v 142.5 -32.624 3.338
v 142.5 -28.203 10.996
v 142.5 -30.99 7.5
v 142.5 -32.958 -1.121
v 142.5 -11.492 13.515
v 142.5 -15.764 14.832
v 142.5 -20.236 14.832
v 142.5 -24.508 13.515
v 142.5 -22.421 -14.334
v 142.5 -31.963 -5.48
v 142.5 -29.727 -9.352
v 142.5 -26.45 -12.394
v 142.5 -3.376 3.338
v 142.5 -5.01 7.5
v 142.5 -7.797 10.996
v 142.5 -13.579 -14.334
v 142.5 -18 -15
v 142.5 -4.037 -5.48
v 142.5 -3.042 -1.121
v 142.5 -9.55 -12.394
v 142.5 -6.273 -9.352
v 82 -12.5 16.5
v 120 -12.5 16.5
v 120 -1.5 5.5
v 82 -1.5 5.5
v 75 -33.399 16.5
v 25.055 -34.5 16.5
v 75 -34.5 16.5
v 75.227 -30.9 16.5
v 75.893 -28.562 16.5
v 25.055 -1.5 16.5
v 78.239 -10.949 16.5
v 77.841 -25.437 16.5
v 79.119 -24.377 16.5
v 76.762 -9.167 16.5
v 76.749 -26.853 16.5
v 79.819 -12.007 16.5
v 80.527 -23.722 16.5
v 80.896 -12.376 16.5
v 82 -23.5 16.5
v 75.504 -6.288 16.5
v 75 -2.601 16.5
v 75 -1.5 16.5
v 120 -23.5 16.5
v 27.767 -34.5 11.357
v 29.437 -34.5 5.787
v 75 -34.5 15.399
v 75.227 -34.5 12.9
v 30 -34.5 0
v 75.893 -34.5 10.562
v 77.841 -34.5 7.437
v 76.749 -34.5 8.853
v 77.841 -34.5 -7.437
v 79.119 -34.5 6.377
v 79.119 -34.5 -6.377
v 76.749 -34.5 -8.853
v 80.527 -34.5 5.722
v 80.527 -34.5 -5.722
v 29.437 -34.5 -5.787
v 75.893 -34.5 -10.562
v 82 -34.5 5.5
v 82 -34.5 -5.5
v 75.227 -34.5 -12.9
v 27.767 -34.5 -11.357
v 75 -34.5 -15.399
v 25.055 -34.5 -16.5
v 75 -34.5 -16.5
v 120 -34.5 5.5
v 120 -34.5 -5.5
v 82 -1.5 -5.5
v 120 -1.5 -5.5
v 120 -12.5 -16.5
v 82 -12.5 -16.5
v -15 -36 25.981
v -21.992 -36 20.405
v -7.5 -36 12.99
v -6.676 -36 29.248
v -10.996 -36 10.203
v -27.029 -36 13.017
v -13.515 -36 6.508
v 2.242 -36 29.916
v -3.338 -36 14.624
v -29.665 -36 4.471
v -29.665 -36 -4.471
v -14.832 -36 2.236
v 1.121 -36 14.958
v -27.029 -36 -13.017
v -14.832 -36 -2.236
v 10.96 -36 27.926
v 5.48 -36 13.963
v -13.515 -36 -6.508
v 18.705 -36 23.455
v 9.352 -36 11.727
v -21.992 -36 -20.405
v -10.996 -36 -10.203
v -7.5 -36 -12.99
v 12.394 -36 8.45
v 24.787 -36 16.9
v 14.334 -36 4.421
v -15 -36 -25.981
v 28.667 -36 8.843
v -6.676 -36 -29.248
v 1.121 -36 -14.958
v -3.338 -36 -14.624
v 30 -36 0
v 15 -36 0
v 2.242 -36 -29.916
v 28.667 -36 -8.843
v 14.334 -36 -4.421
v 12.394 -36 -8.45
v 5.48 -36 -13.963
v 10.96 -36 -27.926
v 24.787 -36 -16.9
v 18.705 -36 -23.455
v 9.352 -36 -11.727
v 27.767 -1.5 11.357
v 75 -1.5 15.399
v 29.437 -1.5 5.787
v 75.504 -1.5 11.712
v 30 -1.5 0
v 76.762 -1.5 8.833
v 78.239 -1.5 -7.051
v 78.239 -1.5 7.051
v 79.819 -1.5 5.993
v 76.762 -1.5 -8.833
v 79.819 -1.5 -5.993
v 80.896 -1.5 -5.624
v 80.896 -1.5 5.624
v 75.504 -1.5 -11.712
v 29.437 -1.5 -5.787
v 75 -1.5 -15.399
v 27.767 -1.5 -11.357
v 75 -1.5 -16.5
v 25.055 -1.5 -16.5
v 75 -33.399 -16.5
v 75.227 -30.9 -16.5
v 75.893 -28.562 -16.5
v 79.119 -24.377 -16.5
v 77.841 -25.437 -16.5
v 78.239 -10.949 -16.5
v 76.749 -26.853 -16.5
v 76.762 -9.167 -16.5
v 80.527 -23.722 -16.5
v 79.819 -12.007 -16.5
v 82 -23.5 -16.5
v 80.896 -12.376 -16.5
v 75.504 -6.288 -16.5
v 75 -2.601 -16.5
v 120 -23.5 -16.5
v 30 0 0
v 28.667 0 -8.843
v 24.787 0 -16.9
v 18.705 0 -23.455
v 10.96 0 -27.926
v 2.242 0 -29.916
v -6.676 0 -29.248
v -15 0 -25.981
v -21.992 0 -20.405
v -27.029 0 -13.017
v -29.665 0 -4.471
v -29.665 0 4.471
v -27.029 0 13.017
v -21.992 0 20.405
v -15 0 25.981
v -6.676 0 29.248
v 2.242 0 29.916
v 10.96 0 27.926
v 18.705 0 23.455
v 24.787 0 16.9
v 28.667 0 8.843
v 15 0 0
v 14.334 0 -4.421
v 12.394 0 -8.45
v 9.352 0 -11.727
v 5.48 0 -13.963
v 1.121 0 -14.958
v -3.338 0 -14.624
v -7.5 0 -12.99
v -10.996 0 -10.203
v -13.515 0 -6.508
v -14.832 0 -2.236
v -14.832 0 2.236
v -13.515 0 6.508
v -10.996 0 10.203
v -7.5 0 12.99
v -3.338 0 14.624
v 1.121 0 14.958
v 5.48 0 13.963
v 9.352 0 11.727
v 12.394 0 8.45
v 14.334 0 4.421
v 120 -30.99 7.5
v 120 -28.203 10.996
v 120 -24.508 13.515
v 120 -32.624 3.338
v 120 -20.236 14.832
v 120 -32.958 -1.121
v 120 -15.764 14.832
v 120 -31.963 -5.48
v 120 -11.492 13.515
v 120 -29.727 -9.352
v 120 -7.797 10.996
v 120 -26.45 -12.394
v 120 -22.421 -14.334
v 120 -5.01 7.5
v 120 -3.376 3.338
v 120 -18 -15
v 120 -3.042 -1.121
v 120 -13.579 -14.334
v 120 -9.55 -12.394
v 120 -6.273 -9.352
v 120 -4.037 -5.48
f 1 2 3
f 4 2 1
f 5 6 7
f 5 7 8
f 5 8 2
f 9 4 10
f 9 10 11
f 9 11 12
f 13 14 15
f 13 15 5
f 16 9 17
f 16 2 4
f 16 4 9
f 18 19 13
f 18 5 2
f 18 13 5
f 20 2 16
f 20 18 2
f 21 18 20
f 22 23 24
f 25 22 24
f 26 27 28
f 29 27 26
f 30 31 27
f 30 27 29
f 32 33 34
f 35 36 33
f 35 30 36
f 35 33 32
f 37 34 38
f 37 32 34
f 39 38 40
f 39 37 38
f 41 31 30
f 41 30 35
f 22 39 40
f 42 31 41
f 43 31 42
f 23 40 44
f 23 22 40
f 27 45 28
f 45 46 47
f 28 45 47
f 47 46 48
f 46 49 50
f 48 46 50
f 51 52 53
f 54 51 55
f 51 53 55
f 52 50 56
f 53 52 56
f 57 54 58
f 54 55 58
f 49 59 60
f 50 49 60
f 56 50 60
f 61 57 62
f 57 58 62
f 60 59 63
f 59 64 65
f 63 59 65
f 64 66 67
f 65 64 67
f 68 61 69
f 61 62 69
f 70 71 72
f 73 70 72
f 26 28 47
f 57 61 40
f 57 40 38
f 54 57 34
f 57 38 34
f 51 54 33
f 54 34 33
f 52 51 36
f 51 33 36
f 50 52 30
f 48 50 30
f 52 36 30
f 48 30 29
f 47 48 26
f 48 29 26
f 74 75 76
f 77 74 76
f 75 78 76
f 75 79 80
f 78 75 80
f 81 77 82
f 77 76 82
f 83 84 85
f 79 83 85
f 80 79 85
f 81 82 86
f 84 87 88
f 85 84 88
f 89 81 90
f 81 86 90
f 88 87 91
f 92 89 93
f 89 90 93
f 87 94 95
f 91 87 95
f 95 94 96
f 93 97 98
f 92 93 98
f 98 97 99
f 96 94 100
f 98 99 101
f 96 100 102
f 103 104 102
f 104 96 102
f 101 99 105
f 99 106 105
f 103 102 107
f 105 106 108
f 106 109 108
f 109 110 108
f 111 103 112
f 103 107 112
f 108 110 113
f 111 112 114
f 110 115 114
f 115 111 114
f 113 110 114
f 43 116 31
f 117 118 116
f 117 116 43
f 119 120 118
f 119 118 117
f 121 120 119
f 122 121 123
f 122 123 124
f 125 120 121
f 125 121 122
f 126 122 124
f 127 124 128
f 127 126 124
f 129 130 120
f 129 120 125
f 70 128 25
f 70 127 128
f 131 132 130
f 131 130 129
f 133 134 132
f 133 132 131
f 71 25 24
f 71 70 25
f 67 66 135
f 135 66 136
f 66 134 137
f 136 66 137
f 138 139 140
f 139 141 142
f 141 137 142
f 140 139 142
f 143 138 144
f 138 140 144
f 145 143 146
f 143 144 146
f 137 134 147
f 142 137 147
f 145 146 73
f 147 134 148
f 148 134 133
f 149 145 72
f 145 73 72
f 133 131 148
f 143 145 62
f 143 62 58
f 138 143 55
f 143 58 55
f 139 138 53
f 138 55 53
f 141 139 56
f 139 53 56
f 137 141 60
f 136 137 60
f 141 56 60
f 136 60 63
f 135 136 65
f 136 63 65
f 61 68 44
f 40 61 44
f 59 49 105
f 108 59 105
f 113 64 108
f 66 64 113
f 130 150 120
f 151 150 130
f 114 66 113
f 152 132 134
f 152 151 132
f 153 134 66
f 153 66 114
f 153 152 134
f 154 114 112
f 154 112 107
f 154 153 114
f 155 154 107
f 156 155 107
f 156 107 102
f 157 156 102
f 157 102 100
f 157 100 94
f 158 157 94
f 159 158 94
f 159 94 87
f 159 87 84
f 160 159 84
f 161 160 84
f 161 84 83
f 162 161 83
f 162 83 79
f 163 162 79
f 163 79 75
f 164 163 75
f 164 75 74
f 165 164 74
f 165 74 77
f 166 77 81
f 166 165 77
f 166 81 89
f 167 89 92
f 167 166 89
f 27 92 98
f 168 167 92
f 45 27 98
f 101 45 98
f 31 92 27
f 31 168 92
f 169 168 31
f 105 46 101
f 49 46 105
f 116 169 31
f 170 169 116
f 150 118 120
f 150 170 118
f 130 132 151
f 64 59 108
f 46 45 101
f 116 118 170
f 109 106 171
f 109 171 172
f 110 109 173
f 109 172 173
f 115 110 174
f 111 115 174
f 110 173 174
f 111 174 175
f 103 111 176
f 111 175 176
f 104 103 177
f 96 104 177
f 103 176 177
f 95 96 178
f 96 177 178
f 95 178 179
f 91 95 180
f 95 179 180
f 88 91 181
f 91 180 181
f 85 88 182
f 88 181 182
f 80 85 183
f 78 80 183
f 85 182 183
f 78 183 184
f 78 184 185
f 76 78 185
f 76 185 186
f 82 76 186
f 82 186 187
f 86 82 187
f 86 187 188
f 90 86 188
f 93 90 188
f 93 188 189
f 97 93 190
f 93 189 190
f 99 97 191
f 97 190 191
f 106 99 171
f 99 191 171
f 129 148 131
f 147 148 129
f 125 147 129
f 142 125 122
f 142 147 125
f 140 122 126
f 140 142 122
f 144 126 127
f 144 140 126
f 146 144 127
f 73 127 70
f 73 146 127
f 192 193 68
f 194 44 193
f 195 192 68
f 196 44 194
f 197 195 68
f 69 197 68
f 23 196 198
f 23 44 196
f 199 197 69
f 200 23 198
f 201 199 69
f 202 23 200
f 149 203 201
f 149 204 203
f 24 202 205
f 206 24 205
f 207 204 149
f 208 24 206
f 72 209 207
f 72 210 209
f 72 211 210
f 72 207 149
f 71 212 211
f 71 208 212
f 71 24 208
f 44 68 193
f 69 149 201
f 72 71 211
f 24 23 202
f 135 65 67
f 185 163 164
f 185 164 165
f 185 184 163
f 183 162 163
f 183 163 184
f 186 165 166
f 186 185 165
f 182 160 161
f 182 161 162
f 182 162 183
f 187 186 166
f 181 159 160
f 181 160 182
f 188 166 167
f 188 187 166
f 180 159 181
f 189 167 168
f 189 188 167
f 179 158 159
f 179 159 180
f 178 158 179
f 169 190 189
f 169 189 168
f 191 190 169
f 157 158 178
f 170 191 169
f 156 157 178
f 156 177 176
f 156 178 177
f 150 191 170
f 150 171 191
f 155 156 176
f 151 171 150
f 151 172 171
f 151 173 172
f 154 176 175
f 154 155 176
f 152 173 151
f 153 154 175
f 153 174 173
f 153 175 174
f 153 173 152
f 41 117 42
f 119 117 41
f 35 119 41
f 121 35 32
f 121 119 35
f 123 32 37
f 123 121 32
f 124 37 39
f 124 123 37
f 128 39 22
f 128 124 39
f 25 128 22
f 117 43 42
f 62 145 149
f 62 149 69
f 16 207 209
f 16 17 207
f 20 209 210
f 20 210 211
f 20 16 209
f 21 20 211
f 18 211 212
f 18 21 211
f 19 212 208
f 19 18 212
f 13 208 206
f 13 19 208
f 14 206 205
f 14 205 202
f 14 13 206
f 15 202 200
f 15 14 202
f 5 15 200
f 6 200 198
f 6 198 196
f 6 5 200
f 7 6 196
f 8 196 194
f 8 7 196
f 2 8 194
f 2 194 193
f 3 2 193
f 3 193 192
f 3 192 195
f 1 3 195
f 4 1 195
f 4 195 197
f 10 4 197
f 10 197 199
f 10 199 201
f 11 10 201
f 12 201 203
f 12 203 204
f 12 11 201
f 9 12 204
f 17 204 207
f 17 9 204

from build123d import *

# Parameters (mm, degrees)
SKETCH1_R           = 30
SKETCH1_R_2         = 15
BOSS_EXTRUDE1_DEPTH = 36
SKETCH2_W           = 94.945060367
SKETCH2_H           = 33
BOSS_EXTRUDE2_DEPTH = 16.5
CUT_EXTRUDE1_DEPTH  = 45
FILLET1_R           = 7
SKETCH4_R           = 15
BOSS_EXTRUDE3_DEPTH = 22.5


with BuildPart() as part:
    # Sketch1 → Boss-Extrude1 (new body)
    with BuildSketch(Plane(origin=(0, 0, 0), x_dir=(1, 0, 0), z_dir=(0, 1, 0))):
        Circle(SKETCH1_R)
        Circle(SKETCH1_R_2, mode=Mode.SUBTRACT)
    extrude(amount=-BOSS_EXTRUDE1_DEPTH)

    # Sketch2 → Boss-Extrude2 (add, symmetric)
    with BuildSketch(Plane(origin=(0, -18, 0), x_dir=(1, 0, 0), z_dir=(0, 1, 0))):
        with Locations((72.527469817, 0)):
            Rectangle(SKETCH2_W, SKETCH2_H)
    extrude(amount=BOSS_EXTRUDE2_DEPTH, both=True)

    # Sketch3 → Cut-Extrude1 (cut)
    with BuildSketch(Plane(origin=(120, 0, 0), x_dir=(0, 0, -1), z_dir=(1, 0, 0))):
        Polygon((5.5, -1.5), (16.5, -12.5), (16.5, -1.5), align=None)
        Polygon((16.5, -34.5), (16.5, -23.5), (5.5, -34.5), align=None)
        Polygon((-16.5, -34.5), (-5.5, -34.5), (-16.5, -23.5), align=None)
        Polygon((-16.5, -1.5), (-16.5, -12.5), (-5.5, -1.5), align=None)
    extrude(amount=-CUT_EXTRUDE1_DEPTH, mode=Mode.SUBTRACT)

    # Fillet1
    fillet1_edges = [part.edges().sort_by_distance(p)[0] for p in [
        (75, -7, 11),
        (75, -29, 11),
        (75, -29, -11),
        (75, -7, -11),
    ]]
    fillet(fillet1_edges, radius=FILLET1_R)

    # Sketch4 → Boss-Extrude3 (add, symmetric)
    with BuildSketch(Plane(origin=(120, 0, 0), x_dir=(0, 0, -1), z_dir=(1, 0, 0))):
        with Locations((0, -18)):
            Circle(SKETCH4_R)
    extrude(amount=BOSS_EXTRUDE3_DEPTH, both=True)


solid = part.part
